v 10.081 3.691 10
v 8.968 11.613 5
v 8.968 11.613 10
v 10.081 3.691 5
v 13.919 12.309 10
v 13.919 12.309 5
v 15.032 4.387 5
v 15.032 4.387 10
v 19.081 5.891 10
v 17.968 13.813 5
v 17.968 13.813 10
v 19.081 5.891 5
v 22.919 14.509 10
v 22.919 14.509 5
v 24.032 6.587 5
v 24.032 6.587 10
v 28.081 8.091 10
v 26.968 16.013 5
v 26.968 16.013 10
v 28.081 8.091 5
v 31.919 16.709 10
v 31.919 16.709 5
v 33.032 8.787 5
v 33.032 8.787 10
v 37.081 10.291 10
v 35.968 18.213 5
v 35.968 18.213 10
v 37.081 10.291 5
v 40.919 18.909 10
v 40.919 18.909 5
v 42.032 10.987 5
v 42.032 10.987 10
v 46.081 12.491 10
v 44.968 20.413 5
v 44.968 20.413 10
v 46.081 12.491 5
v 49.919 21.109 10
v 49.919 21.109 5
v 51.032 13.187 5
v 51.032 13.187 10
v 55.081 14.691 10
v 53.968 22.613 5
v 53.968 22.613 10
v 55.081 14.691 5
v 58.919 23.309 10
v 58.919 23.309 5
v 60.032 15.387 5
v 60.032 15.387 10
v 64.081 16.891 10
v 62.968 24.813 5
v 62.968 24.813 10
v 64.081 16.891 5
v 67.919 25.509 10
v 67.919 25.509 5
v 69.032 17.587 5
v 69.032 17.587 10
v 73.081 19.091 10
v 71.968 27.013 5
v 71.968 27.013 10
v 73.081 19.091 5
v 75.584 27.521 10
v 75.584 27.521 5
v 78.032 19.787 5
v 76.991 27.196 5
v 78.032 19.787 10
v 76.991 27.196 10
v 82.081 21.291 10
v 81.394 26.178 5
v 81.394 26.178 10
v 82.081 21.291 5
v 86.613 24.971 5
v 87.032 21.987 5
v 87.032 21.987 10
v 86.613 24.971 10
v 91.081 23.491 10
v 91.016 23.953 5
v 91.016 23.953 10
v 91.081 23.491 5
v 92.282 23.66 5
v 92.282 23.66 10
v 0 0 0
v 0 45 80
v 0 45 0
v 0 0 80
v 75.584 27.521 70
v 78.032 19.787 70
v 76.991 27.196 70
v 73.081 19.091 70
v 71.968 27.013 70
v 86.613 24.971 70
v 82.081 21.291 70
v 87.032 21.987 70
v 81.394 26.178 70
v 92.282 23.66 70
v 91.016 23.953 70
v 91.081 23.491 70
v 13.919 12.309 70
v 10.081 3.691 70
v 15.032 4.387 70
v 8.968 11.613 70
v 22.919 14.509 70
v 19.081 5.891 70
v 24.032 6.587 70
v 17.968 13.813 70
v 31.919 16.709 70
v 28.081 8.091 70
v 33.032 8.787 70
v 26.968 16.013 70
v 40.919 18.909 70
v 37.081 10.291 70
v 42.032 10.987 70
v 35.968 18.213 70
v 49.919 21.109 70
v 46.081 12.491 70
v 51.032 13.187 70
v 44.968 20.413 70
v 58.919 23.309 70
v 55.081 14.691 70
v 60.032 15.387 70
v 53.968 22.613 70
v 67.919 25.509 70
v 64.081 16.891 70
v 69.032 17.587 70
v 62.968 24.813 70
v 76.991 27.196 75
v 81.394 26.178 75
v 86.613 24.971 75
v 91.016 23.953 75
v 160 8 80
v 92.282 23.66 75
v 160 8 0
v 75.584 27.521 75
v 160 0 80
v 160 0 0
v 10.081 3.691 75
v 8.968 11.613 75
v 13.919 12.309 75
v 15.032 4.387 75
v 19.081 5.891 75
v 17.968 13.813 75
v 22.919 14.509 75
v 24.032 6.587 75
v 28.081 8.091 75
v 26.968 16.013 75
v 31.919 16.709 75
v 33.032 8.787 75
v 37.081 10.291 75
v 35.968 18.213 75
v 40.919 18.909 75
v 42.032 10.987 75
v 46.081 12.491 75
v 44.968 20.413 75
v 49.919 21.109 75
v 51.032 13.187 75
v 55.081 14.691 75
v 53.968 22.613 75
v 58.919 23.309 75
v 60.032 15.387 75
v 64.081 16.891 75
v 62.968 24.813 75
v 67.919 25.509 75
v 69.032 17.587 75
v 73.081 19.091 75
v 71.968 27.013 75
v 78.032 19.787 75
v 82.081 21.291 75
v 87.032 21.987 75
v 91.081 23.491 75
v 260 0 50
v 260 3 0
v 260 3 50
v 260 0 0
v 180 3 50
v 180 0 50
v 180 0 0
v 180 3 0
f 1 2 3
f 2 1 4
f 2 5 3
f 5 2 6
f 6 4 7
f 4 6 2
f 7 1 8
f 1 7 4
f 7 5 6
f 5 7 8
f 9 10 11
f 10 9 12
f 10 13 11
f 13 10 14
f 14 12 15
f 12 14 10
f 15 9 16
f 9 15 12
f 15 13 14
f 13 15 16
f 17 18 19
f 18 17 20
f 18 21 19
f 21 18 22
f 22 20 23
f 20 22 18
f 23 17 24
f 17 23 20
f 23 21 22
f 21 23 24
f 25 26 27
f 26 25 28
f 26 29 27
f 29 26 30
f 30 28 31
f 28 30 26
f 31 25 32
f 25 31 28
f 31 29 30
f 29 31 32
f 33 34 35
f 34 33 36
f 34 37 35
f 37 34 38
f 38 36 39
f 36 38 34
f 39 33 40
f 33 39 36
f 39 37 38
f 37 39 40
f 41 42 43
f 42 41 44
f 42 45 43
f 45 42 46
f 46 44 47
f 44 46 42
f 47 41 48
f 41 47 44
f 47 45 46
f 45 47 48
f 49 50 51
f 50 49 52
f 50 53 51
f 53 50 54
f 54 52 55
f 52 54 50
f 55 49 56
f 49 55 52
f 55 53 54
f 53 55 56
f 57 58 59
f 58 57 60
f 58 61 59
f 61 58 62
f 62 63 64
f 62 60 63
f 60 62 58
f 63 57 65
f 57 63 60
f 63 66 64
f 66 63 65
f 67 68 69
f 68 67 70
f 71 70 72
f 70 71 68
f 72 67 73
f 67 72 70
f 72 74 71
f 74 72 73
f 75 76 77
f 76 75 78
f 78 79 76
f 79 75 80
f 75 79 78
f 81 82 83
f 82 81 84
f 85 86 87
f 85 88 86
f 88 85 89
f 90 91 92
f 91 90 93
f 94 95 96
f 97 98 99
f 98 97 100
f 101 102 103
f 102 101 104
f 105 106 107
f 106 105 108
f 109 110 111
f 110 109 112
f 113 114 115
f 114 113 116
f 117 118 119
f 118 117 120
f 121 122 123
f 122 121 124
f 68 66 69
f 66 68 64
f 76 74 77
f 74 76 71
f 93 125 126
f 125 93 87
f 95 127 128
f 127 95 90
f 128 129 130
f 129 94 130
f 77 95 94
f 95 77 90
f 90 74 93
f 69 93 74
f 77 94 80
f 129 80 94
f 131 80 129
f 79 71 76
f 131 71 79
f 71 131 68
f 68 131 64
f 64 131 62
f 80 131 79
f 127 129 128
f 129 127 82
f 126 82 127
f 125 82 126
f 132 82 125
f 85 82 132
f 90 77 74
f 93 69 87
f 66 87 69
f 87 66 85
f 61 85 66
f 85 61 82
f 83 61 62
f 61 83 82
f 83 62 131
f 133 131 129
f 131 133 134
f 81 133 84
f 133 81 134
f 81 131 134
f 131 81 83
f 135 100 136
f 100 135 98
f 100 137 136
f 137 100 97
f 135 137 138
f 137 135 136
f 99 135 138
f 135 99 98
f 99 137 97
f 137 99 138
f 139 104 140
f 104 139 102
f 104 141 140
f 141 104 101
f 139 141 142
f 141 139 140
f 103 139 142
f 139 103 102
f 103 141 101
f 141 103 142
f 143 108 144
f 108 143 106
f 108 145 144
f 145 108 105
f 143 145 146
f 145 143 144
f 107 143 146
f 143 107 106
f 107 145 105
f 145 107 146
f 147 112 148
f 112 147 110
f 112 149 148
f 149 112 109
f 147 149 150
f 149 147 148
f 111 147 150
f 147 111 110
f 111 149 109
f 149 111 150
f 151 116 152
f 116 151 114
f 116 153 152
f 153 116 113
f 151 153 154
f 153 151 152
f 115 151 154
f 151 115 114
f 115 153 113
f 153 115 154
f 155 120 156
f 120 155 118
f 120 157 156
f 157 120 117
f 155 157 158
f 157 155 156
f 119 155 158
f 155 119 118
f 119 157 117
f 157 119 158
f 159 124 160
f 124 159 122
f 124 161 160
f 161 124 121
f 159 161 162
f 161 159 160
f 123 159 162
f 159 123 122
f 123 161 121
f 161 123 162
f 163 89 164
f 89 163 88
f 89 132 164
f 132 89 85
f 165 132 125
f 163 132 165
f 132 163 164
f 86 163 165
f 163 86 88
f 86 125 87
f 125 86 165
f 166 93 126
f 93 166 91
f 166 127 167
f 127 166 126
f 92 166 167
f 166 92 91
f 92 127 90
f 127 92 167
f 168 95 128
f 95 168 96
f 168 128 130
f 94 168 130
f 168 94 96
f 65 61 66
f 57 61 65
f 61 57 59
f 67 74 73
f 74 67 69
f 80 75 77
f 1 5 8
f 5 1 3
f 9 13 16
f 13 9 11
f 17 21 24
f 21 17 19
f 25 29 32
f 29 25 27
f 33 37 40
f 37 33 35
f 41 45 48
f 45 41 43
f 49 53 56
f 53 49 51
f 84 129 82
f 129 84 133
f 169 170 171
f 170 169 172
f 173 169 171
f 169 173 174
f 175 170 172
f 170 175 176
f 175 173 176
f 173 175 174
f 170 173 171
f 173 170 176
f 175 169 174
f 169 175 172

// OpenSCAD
// LadderLevel Template A — Compact interlocking wedge (mm)
$fn=32;
L=160; W=70; Hmax=45; Hmin=8;
module wedge(teeth=true){
  difference(){
    linear_extrude(W) polygon([[0,0],[L,0],[L,Hmin],[0,Hmax]]);
    if(teeth) for(i=[0:14]) translate([12+i*9, Hmin+i*2.2, W/2-15])
      rotate([0,0,8]) cube([5,8,30], center=true);
    // pad recess
    translate([20,Hmax-3,10]) cube([80,4,W-20]);
  }
}
wedge();
translate([0,0,W+10]) mirror([0,0,1]) wedge();
translate([180,0,0]) cube([80,3,50]); // TPU pad blank
